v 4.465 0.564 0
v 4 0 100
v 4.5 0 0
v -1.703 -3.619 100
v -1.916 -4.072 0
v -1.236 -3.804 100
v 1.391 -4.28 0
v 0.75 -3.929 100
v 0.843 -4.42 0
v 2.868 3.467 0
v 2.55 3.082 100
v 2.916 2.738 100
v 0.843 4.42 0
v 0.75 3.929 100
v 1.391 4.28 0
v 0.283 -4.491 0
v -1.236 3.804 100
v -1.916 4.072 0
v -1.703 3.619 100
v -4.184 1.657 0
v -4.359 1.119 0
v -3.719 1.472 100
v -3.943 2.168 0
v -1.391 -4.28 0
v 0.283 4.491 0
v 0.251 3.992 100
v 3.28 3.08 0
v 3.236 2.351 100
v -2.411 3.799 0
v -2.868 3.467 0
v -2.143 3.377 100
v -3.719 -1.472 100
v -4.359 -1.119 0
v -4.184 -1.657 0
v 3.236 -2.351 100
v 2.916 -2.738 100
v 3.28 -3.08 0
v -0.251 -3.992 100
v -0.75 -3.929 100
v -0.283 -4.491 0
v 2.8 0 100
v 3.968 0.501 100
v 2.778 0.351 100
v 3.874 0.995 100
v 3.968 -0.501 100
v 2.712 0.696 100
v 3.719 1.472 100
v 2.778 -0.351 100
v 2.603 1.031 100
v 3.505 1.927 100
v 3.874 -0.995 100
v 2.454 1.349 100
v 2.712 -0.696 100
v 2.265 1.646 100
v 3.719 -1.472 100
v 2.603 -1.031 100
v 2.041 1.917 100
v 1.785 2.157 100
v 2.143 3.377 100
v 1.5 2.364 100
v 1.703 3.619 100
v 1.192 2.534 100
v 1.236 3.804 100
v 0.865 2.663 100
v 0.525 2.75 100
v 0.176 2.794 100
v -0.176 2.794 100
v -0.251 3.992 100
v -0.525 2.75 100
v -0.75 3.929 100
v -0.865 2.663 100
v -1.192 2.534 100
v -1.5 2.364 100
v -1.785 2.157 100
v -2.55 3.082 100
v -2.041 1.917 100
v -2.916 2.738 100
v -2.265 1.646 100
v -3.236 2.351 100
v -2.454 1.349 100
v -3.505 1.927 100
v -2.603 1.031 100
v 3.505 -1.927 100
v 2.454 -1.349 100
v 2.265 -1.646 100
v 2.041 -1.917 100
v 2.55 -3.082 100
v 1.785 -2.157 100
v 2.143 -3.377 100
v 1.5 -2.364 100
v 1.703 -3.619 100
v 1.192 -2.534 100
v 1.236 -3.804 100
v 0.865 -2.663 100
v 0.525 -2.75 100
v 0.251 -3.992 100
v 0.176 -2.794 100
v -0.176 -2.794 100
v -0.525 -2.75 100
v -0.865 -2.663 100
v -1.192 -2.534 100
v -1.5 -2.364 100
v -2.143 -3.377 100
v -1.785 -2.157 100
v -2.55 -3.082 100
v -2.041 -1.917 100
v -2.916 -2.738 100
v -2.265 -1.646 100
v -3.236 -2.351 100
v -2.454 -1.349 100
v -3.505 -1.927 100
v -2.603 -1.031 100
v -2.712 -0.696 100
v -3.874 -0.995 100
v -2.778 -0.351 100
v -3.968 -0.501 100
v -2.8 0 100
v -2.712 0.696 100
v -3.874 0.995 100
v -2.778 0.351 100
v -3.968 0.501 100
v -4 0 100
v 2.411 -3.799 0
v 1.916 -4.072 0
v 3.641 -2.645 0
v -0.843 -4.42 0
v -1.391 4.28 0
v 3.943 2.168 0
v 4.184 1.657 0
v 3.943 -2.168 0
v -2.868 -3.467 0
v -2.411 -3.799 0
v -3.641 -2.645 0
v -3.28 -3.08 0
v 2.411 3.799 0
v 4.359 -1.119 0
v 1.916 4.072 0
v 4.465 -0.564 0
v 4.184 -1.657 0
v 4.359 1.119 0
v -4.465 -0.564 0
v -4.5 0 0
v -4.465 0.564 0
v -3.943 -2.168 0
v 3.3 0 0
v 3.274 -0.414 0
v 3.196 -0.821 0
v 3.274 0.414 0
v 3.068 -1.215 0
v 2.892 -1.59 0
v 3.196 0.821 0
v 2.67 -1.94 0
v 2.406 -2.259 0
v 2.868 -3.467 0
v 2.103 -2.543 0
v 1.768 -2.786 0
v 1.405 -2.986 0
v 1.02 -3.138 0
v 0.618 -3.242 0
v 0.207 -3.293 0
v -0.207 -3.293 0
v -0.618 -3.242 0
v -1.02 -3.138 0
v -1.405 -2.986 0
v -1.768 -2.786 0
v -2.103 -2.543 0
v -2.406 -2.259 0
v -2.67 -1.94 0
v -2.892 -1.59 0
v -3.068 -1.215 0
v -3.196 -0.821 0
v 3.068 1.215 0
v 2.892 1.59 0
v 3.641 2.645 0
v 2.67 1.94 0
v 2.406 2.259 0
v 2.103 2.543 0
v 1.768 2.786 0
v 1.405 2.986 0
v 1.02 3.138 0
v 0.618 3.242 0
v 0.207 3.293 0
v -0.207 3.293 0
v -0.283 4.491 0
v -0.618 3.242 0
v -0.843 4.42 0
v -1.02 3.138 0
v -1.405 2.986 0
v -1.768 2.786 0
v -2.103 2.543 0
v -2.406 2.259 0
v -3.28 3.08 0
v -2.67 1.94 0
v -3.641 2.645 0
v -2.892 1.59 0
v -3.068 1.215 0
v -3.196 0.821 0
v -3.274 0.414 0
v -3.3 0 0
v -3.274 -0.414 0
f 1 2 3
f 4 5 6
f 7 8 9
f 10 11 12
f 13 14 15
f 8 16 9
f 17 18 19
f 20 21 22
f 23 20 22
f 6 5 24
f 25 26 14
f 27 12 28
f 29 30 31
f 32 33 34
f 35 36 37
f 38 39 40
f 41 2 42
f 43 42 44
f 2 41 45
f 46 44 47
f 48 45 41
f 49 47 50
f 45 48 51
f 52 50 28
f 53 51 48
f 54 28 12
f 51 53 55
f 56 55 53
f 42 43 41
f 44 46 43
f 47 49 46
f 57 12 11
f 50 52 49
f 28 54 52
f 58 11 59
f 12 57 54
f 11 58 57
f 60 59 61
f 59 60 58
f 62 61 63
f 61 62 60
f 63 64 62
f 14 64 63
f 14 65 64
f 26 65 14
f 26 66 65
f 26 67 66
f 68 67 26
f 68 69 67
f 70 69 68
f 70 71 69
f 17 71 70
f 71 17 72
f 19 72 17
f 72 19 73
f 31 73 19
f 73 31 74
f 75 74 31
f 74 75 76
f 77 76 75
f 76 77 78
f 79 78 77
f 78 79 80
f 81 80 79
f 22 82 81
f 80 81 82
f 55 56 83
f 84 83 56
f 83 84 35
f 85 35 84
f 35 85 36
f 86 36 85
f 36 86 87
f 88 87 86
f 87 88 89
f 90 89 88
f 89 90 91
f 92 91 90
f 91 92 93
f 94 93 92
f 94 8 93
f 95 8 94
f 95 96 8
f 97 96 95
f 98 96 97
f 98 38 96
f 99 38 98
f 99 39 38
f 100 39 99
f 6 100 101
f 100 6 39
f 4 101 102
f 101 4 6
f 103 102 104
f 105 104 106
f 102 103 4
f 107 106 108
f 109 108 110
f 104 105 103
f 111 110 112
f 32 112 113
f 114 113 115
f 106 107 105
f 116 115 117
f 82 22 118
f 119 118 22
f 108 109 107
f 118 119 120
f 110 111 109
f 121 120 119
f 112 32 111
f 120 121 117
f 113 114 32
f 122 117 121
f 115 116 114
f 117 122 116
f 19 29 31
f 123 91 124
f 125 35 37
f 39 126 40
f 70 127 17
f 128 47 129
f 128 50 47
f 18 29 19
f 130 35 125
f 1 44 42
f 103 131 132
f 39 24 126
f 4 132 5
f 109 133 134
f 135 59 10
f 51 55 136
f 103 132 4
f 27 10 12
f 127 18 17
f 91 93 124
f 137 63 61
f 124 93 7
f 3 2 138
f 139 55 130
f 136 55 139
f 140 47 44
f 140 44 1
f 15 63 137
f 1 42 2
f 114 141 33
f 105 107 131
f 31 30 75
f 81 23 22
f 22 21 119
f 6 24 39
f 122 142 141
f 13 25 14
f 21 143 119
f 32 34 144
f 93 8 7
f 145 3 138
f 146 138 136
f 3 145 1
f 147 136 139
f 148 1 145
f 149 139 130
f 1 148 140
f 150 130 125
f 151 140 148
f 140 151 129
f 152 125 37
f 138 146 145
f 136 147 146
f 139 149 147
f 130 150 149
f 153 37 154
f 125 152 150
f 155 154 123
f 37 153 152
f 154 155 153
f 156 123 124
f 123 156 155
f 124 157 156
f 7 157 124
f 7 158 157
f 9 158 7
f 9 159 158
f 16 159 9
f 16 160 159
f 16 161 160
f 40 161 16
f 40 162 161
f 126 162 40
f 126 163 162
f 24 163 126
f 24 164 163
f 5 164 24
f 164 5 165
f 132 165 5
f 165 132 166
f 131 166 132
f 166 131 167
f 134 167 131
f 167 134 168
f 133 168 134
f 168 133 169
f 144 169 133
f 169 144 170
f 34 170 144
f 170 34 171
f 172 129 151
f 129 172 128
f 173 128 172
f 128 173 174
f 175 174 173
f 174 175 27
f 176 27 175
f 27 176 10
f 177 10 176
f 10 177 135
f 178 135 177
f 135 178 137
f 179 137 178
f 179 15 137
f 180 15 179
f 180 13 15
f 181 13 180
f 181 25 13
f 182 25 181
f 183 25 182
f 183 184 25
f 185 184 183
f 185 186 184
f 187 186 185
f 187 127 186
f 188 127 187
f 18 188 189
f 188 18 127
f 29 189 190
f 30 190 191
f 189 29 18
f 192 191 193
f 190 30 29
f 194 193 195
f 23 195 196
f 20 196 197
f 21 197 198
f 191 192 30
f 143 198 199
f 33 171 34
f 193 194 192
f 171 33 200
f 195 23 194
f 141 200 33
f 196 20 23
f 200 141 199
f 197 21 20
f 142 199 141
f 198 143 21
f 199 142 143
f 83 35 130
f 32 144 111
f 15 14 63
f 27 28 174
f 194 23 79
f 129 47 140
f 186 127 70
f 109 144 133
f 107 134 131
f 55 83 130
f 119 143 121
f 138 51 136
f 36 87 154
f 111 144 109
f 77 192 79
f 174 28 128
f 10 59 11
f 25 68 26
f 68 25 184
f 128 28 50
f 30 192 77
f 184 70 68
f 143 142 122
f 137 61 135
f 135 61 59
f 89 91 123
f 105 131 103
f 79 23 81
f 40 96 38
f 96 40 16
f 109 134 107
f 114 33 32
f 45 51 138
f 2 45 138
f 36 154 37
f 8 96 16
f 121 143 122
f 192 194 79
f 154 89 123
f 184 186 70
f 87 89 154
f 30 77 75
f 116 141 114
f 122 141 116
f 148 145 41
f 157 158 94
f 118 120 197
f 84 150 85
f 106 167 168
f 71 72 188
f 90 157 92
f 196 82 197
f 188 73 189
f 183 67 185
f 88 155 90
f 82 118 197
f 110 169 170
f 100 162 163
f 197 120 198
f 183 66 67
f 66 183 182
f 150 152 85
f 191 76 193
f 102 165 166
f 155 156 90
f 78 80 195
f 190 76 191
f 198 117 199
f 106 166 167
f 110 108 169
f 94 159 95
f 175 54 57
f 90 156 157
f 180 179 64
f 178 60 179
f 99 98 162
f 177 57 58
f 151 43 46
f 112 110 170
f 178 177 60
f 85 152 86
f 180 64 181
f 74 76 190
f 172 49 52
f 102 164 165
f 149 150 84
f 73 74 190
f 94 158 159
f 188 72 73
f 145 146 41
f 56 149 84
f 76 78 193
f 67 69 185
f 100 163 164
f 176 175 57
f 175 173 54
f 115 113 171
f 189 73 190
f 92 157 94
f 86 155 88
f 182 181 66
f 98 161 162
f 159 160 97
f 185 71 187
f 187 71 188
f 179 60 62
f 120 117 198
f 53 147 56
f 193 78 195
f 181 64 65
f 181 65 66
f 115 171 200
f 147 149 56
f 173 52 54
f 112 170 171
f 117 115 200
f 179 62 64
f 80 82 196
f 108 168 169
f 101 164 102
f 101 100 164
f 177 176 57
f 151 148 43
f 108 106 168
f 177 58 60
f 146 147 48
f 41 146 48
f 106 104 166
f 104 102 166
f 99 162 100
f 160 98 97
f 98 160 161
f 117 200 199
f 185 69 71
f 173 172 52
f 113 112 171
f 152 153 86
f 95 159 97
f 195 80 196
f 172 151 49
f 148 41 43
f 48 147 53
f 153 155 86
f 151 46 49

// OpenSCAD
$fn = 50;
s = 1.2;

l = 100;
w1 = 4.5;
w2 = 4;

difference(){
cylinder(l,w1,w2);
cylinder(l,w1-s,w2-s);

}
